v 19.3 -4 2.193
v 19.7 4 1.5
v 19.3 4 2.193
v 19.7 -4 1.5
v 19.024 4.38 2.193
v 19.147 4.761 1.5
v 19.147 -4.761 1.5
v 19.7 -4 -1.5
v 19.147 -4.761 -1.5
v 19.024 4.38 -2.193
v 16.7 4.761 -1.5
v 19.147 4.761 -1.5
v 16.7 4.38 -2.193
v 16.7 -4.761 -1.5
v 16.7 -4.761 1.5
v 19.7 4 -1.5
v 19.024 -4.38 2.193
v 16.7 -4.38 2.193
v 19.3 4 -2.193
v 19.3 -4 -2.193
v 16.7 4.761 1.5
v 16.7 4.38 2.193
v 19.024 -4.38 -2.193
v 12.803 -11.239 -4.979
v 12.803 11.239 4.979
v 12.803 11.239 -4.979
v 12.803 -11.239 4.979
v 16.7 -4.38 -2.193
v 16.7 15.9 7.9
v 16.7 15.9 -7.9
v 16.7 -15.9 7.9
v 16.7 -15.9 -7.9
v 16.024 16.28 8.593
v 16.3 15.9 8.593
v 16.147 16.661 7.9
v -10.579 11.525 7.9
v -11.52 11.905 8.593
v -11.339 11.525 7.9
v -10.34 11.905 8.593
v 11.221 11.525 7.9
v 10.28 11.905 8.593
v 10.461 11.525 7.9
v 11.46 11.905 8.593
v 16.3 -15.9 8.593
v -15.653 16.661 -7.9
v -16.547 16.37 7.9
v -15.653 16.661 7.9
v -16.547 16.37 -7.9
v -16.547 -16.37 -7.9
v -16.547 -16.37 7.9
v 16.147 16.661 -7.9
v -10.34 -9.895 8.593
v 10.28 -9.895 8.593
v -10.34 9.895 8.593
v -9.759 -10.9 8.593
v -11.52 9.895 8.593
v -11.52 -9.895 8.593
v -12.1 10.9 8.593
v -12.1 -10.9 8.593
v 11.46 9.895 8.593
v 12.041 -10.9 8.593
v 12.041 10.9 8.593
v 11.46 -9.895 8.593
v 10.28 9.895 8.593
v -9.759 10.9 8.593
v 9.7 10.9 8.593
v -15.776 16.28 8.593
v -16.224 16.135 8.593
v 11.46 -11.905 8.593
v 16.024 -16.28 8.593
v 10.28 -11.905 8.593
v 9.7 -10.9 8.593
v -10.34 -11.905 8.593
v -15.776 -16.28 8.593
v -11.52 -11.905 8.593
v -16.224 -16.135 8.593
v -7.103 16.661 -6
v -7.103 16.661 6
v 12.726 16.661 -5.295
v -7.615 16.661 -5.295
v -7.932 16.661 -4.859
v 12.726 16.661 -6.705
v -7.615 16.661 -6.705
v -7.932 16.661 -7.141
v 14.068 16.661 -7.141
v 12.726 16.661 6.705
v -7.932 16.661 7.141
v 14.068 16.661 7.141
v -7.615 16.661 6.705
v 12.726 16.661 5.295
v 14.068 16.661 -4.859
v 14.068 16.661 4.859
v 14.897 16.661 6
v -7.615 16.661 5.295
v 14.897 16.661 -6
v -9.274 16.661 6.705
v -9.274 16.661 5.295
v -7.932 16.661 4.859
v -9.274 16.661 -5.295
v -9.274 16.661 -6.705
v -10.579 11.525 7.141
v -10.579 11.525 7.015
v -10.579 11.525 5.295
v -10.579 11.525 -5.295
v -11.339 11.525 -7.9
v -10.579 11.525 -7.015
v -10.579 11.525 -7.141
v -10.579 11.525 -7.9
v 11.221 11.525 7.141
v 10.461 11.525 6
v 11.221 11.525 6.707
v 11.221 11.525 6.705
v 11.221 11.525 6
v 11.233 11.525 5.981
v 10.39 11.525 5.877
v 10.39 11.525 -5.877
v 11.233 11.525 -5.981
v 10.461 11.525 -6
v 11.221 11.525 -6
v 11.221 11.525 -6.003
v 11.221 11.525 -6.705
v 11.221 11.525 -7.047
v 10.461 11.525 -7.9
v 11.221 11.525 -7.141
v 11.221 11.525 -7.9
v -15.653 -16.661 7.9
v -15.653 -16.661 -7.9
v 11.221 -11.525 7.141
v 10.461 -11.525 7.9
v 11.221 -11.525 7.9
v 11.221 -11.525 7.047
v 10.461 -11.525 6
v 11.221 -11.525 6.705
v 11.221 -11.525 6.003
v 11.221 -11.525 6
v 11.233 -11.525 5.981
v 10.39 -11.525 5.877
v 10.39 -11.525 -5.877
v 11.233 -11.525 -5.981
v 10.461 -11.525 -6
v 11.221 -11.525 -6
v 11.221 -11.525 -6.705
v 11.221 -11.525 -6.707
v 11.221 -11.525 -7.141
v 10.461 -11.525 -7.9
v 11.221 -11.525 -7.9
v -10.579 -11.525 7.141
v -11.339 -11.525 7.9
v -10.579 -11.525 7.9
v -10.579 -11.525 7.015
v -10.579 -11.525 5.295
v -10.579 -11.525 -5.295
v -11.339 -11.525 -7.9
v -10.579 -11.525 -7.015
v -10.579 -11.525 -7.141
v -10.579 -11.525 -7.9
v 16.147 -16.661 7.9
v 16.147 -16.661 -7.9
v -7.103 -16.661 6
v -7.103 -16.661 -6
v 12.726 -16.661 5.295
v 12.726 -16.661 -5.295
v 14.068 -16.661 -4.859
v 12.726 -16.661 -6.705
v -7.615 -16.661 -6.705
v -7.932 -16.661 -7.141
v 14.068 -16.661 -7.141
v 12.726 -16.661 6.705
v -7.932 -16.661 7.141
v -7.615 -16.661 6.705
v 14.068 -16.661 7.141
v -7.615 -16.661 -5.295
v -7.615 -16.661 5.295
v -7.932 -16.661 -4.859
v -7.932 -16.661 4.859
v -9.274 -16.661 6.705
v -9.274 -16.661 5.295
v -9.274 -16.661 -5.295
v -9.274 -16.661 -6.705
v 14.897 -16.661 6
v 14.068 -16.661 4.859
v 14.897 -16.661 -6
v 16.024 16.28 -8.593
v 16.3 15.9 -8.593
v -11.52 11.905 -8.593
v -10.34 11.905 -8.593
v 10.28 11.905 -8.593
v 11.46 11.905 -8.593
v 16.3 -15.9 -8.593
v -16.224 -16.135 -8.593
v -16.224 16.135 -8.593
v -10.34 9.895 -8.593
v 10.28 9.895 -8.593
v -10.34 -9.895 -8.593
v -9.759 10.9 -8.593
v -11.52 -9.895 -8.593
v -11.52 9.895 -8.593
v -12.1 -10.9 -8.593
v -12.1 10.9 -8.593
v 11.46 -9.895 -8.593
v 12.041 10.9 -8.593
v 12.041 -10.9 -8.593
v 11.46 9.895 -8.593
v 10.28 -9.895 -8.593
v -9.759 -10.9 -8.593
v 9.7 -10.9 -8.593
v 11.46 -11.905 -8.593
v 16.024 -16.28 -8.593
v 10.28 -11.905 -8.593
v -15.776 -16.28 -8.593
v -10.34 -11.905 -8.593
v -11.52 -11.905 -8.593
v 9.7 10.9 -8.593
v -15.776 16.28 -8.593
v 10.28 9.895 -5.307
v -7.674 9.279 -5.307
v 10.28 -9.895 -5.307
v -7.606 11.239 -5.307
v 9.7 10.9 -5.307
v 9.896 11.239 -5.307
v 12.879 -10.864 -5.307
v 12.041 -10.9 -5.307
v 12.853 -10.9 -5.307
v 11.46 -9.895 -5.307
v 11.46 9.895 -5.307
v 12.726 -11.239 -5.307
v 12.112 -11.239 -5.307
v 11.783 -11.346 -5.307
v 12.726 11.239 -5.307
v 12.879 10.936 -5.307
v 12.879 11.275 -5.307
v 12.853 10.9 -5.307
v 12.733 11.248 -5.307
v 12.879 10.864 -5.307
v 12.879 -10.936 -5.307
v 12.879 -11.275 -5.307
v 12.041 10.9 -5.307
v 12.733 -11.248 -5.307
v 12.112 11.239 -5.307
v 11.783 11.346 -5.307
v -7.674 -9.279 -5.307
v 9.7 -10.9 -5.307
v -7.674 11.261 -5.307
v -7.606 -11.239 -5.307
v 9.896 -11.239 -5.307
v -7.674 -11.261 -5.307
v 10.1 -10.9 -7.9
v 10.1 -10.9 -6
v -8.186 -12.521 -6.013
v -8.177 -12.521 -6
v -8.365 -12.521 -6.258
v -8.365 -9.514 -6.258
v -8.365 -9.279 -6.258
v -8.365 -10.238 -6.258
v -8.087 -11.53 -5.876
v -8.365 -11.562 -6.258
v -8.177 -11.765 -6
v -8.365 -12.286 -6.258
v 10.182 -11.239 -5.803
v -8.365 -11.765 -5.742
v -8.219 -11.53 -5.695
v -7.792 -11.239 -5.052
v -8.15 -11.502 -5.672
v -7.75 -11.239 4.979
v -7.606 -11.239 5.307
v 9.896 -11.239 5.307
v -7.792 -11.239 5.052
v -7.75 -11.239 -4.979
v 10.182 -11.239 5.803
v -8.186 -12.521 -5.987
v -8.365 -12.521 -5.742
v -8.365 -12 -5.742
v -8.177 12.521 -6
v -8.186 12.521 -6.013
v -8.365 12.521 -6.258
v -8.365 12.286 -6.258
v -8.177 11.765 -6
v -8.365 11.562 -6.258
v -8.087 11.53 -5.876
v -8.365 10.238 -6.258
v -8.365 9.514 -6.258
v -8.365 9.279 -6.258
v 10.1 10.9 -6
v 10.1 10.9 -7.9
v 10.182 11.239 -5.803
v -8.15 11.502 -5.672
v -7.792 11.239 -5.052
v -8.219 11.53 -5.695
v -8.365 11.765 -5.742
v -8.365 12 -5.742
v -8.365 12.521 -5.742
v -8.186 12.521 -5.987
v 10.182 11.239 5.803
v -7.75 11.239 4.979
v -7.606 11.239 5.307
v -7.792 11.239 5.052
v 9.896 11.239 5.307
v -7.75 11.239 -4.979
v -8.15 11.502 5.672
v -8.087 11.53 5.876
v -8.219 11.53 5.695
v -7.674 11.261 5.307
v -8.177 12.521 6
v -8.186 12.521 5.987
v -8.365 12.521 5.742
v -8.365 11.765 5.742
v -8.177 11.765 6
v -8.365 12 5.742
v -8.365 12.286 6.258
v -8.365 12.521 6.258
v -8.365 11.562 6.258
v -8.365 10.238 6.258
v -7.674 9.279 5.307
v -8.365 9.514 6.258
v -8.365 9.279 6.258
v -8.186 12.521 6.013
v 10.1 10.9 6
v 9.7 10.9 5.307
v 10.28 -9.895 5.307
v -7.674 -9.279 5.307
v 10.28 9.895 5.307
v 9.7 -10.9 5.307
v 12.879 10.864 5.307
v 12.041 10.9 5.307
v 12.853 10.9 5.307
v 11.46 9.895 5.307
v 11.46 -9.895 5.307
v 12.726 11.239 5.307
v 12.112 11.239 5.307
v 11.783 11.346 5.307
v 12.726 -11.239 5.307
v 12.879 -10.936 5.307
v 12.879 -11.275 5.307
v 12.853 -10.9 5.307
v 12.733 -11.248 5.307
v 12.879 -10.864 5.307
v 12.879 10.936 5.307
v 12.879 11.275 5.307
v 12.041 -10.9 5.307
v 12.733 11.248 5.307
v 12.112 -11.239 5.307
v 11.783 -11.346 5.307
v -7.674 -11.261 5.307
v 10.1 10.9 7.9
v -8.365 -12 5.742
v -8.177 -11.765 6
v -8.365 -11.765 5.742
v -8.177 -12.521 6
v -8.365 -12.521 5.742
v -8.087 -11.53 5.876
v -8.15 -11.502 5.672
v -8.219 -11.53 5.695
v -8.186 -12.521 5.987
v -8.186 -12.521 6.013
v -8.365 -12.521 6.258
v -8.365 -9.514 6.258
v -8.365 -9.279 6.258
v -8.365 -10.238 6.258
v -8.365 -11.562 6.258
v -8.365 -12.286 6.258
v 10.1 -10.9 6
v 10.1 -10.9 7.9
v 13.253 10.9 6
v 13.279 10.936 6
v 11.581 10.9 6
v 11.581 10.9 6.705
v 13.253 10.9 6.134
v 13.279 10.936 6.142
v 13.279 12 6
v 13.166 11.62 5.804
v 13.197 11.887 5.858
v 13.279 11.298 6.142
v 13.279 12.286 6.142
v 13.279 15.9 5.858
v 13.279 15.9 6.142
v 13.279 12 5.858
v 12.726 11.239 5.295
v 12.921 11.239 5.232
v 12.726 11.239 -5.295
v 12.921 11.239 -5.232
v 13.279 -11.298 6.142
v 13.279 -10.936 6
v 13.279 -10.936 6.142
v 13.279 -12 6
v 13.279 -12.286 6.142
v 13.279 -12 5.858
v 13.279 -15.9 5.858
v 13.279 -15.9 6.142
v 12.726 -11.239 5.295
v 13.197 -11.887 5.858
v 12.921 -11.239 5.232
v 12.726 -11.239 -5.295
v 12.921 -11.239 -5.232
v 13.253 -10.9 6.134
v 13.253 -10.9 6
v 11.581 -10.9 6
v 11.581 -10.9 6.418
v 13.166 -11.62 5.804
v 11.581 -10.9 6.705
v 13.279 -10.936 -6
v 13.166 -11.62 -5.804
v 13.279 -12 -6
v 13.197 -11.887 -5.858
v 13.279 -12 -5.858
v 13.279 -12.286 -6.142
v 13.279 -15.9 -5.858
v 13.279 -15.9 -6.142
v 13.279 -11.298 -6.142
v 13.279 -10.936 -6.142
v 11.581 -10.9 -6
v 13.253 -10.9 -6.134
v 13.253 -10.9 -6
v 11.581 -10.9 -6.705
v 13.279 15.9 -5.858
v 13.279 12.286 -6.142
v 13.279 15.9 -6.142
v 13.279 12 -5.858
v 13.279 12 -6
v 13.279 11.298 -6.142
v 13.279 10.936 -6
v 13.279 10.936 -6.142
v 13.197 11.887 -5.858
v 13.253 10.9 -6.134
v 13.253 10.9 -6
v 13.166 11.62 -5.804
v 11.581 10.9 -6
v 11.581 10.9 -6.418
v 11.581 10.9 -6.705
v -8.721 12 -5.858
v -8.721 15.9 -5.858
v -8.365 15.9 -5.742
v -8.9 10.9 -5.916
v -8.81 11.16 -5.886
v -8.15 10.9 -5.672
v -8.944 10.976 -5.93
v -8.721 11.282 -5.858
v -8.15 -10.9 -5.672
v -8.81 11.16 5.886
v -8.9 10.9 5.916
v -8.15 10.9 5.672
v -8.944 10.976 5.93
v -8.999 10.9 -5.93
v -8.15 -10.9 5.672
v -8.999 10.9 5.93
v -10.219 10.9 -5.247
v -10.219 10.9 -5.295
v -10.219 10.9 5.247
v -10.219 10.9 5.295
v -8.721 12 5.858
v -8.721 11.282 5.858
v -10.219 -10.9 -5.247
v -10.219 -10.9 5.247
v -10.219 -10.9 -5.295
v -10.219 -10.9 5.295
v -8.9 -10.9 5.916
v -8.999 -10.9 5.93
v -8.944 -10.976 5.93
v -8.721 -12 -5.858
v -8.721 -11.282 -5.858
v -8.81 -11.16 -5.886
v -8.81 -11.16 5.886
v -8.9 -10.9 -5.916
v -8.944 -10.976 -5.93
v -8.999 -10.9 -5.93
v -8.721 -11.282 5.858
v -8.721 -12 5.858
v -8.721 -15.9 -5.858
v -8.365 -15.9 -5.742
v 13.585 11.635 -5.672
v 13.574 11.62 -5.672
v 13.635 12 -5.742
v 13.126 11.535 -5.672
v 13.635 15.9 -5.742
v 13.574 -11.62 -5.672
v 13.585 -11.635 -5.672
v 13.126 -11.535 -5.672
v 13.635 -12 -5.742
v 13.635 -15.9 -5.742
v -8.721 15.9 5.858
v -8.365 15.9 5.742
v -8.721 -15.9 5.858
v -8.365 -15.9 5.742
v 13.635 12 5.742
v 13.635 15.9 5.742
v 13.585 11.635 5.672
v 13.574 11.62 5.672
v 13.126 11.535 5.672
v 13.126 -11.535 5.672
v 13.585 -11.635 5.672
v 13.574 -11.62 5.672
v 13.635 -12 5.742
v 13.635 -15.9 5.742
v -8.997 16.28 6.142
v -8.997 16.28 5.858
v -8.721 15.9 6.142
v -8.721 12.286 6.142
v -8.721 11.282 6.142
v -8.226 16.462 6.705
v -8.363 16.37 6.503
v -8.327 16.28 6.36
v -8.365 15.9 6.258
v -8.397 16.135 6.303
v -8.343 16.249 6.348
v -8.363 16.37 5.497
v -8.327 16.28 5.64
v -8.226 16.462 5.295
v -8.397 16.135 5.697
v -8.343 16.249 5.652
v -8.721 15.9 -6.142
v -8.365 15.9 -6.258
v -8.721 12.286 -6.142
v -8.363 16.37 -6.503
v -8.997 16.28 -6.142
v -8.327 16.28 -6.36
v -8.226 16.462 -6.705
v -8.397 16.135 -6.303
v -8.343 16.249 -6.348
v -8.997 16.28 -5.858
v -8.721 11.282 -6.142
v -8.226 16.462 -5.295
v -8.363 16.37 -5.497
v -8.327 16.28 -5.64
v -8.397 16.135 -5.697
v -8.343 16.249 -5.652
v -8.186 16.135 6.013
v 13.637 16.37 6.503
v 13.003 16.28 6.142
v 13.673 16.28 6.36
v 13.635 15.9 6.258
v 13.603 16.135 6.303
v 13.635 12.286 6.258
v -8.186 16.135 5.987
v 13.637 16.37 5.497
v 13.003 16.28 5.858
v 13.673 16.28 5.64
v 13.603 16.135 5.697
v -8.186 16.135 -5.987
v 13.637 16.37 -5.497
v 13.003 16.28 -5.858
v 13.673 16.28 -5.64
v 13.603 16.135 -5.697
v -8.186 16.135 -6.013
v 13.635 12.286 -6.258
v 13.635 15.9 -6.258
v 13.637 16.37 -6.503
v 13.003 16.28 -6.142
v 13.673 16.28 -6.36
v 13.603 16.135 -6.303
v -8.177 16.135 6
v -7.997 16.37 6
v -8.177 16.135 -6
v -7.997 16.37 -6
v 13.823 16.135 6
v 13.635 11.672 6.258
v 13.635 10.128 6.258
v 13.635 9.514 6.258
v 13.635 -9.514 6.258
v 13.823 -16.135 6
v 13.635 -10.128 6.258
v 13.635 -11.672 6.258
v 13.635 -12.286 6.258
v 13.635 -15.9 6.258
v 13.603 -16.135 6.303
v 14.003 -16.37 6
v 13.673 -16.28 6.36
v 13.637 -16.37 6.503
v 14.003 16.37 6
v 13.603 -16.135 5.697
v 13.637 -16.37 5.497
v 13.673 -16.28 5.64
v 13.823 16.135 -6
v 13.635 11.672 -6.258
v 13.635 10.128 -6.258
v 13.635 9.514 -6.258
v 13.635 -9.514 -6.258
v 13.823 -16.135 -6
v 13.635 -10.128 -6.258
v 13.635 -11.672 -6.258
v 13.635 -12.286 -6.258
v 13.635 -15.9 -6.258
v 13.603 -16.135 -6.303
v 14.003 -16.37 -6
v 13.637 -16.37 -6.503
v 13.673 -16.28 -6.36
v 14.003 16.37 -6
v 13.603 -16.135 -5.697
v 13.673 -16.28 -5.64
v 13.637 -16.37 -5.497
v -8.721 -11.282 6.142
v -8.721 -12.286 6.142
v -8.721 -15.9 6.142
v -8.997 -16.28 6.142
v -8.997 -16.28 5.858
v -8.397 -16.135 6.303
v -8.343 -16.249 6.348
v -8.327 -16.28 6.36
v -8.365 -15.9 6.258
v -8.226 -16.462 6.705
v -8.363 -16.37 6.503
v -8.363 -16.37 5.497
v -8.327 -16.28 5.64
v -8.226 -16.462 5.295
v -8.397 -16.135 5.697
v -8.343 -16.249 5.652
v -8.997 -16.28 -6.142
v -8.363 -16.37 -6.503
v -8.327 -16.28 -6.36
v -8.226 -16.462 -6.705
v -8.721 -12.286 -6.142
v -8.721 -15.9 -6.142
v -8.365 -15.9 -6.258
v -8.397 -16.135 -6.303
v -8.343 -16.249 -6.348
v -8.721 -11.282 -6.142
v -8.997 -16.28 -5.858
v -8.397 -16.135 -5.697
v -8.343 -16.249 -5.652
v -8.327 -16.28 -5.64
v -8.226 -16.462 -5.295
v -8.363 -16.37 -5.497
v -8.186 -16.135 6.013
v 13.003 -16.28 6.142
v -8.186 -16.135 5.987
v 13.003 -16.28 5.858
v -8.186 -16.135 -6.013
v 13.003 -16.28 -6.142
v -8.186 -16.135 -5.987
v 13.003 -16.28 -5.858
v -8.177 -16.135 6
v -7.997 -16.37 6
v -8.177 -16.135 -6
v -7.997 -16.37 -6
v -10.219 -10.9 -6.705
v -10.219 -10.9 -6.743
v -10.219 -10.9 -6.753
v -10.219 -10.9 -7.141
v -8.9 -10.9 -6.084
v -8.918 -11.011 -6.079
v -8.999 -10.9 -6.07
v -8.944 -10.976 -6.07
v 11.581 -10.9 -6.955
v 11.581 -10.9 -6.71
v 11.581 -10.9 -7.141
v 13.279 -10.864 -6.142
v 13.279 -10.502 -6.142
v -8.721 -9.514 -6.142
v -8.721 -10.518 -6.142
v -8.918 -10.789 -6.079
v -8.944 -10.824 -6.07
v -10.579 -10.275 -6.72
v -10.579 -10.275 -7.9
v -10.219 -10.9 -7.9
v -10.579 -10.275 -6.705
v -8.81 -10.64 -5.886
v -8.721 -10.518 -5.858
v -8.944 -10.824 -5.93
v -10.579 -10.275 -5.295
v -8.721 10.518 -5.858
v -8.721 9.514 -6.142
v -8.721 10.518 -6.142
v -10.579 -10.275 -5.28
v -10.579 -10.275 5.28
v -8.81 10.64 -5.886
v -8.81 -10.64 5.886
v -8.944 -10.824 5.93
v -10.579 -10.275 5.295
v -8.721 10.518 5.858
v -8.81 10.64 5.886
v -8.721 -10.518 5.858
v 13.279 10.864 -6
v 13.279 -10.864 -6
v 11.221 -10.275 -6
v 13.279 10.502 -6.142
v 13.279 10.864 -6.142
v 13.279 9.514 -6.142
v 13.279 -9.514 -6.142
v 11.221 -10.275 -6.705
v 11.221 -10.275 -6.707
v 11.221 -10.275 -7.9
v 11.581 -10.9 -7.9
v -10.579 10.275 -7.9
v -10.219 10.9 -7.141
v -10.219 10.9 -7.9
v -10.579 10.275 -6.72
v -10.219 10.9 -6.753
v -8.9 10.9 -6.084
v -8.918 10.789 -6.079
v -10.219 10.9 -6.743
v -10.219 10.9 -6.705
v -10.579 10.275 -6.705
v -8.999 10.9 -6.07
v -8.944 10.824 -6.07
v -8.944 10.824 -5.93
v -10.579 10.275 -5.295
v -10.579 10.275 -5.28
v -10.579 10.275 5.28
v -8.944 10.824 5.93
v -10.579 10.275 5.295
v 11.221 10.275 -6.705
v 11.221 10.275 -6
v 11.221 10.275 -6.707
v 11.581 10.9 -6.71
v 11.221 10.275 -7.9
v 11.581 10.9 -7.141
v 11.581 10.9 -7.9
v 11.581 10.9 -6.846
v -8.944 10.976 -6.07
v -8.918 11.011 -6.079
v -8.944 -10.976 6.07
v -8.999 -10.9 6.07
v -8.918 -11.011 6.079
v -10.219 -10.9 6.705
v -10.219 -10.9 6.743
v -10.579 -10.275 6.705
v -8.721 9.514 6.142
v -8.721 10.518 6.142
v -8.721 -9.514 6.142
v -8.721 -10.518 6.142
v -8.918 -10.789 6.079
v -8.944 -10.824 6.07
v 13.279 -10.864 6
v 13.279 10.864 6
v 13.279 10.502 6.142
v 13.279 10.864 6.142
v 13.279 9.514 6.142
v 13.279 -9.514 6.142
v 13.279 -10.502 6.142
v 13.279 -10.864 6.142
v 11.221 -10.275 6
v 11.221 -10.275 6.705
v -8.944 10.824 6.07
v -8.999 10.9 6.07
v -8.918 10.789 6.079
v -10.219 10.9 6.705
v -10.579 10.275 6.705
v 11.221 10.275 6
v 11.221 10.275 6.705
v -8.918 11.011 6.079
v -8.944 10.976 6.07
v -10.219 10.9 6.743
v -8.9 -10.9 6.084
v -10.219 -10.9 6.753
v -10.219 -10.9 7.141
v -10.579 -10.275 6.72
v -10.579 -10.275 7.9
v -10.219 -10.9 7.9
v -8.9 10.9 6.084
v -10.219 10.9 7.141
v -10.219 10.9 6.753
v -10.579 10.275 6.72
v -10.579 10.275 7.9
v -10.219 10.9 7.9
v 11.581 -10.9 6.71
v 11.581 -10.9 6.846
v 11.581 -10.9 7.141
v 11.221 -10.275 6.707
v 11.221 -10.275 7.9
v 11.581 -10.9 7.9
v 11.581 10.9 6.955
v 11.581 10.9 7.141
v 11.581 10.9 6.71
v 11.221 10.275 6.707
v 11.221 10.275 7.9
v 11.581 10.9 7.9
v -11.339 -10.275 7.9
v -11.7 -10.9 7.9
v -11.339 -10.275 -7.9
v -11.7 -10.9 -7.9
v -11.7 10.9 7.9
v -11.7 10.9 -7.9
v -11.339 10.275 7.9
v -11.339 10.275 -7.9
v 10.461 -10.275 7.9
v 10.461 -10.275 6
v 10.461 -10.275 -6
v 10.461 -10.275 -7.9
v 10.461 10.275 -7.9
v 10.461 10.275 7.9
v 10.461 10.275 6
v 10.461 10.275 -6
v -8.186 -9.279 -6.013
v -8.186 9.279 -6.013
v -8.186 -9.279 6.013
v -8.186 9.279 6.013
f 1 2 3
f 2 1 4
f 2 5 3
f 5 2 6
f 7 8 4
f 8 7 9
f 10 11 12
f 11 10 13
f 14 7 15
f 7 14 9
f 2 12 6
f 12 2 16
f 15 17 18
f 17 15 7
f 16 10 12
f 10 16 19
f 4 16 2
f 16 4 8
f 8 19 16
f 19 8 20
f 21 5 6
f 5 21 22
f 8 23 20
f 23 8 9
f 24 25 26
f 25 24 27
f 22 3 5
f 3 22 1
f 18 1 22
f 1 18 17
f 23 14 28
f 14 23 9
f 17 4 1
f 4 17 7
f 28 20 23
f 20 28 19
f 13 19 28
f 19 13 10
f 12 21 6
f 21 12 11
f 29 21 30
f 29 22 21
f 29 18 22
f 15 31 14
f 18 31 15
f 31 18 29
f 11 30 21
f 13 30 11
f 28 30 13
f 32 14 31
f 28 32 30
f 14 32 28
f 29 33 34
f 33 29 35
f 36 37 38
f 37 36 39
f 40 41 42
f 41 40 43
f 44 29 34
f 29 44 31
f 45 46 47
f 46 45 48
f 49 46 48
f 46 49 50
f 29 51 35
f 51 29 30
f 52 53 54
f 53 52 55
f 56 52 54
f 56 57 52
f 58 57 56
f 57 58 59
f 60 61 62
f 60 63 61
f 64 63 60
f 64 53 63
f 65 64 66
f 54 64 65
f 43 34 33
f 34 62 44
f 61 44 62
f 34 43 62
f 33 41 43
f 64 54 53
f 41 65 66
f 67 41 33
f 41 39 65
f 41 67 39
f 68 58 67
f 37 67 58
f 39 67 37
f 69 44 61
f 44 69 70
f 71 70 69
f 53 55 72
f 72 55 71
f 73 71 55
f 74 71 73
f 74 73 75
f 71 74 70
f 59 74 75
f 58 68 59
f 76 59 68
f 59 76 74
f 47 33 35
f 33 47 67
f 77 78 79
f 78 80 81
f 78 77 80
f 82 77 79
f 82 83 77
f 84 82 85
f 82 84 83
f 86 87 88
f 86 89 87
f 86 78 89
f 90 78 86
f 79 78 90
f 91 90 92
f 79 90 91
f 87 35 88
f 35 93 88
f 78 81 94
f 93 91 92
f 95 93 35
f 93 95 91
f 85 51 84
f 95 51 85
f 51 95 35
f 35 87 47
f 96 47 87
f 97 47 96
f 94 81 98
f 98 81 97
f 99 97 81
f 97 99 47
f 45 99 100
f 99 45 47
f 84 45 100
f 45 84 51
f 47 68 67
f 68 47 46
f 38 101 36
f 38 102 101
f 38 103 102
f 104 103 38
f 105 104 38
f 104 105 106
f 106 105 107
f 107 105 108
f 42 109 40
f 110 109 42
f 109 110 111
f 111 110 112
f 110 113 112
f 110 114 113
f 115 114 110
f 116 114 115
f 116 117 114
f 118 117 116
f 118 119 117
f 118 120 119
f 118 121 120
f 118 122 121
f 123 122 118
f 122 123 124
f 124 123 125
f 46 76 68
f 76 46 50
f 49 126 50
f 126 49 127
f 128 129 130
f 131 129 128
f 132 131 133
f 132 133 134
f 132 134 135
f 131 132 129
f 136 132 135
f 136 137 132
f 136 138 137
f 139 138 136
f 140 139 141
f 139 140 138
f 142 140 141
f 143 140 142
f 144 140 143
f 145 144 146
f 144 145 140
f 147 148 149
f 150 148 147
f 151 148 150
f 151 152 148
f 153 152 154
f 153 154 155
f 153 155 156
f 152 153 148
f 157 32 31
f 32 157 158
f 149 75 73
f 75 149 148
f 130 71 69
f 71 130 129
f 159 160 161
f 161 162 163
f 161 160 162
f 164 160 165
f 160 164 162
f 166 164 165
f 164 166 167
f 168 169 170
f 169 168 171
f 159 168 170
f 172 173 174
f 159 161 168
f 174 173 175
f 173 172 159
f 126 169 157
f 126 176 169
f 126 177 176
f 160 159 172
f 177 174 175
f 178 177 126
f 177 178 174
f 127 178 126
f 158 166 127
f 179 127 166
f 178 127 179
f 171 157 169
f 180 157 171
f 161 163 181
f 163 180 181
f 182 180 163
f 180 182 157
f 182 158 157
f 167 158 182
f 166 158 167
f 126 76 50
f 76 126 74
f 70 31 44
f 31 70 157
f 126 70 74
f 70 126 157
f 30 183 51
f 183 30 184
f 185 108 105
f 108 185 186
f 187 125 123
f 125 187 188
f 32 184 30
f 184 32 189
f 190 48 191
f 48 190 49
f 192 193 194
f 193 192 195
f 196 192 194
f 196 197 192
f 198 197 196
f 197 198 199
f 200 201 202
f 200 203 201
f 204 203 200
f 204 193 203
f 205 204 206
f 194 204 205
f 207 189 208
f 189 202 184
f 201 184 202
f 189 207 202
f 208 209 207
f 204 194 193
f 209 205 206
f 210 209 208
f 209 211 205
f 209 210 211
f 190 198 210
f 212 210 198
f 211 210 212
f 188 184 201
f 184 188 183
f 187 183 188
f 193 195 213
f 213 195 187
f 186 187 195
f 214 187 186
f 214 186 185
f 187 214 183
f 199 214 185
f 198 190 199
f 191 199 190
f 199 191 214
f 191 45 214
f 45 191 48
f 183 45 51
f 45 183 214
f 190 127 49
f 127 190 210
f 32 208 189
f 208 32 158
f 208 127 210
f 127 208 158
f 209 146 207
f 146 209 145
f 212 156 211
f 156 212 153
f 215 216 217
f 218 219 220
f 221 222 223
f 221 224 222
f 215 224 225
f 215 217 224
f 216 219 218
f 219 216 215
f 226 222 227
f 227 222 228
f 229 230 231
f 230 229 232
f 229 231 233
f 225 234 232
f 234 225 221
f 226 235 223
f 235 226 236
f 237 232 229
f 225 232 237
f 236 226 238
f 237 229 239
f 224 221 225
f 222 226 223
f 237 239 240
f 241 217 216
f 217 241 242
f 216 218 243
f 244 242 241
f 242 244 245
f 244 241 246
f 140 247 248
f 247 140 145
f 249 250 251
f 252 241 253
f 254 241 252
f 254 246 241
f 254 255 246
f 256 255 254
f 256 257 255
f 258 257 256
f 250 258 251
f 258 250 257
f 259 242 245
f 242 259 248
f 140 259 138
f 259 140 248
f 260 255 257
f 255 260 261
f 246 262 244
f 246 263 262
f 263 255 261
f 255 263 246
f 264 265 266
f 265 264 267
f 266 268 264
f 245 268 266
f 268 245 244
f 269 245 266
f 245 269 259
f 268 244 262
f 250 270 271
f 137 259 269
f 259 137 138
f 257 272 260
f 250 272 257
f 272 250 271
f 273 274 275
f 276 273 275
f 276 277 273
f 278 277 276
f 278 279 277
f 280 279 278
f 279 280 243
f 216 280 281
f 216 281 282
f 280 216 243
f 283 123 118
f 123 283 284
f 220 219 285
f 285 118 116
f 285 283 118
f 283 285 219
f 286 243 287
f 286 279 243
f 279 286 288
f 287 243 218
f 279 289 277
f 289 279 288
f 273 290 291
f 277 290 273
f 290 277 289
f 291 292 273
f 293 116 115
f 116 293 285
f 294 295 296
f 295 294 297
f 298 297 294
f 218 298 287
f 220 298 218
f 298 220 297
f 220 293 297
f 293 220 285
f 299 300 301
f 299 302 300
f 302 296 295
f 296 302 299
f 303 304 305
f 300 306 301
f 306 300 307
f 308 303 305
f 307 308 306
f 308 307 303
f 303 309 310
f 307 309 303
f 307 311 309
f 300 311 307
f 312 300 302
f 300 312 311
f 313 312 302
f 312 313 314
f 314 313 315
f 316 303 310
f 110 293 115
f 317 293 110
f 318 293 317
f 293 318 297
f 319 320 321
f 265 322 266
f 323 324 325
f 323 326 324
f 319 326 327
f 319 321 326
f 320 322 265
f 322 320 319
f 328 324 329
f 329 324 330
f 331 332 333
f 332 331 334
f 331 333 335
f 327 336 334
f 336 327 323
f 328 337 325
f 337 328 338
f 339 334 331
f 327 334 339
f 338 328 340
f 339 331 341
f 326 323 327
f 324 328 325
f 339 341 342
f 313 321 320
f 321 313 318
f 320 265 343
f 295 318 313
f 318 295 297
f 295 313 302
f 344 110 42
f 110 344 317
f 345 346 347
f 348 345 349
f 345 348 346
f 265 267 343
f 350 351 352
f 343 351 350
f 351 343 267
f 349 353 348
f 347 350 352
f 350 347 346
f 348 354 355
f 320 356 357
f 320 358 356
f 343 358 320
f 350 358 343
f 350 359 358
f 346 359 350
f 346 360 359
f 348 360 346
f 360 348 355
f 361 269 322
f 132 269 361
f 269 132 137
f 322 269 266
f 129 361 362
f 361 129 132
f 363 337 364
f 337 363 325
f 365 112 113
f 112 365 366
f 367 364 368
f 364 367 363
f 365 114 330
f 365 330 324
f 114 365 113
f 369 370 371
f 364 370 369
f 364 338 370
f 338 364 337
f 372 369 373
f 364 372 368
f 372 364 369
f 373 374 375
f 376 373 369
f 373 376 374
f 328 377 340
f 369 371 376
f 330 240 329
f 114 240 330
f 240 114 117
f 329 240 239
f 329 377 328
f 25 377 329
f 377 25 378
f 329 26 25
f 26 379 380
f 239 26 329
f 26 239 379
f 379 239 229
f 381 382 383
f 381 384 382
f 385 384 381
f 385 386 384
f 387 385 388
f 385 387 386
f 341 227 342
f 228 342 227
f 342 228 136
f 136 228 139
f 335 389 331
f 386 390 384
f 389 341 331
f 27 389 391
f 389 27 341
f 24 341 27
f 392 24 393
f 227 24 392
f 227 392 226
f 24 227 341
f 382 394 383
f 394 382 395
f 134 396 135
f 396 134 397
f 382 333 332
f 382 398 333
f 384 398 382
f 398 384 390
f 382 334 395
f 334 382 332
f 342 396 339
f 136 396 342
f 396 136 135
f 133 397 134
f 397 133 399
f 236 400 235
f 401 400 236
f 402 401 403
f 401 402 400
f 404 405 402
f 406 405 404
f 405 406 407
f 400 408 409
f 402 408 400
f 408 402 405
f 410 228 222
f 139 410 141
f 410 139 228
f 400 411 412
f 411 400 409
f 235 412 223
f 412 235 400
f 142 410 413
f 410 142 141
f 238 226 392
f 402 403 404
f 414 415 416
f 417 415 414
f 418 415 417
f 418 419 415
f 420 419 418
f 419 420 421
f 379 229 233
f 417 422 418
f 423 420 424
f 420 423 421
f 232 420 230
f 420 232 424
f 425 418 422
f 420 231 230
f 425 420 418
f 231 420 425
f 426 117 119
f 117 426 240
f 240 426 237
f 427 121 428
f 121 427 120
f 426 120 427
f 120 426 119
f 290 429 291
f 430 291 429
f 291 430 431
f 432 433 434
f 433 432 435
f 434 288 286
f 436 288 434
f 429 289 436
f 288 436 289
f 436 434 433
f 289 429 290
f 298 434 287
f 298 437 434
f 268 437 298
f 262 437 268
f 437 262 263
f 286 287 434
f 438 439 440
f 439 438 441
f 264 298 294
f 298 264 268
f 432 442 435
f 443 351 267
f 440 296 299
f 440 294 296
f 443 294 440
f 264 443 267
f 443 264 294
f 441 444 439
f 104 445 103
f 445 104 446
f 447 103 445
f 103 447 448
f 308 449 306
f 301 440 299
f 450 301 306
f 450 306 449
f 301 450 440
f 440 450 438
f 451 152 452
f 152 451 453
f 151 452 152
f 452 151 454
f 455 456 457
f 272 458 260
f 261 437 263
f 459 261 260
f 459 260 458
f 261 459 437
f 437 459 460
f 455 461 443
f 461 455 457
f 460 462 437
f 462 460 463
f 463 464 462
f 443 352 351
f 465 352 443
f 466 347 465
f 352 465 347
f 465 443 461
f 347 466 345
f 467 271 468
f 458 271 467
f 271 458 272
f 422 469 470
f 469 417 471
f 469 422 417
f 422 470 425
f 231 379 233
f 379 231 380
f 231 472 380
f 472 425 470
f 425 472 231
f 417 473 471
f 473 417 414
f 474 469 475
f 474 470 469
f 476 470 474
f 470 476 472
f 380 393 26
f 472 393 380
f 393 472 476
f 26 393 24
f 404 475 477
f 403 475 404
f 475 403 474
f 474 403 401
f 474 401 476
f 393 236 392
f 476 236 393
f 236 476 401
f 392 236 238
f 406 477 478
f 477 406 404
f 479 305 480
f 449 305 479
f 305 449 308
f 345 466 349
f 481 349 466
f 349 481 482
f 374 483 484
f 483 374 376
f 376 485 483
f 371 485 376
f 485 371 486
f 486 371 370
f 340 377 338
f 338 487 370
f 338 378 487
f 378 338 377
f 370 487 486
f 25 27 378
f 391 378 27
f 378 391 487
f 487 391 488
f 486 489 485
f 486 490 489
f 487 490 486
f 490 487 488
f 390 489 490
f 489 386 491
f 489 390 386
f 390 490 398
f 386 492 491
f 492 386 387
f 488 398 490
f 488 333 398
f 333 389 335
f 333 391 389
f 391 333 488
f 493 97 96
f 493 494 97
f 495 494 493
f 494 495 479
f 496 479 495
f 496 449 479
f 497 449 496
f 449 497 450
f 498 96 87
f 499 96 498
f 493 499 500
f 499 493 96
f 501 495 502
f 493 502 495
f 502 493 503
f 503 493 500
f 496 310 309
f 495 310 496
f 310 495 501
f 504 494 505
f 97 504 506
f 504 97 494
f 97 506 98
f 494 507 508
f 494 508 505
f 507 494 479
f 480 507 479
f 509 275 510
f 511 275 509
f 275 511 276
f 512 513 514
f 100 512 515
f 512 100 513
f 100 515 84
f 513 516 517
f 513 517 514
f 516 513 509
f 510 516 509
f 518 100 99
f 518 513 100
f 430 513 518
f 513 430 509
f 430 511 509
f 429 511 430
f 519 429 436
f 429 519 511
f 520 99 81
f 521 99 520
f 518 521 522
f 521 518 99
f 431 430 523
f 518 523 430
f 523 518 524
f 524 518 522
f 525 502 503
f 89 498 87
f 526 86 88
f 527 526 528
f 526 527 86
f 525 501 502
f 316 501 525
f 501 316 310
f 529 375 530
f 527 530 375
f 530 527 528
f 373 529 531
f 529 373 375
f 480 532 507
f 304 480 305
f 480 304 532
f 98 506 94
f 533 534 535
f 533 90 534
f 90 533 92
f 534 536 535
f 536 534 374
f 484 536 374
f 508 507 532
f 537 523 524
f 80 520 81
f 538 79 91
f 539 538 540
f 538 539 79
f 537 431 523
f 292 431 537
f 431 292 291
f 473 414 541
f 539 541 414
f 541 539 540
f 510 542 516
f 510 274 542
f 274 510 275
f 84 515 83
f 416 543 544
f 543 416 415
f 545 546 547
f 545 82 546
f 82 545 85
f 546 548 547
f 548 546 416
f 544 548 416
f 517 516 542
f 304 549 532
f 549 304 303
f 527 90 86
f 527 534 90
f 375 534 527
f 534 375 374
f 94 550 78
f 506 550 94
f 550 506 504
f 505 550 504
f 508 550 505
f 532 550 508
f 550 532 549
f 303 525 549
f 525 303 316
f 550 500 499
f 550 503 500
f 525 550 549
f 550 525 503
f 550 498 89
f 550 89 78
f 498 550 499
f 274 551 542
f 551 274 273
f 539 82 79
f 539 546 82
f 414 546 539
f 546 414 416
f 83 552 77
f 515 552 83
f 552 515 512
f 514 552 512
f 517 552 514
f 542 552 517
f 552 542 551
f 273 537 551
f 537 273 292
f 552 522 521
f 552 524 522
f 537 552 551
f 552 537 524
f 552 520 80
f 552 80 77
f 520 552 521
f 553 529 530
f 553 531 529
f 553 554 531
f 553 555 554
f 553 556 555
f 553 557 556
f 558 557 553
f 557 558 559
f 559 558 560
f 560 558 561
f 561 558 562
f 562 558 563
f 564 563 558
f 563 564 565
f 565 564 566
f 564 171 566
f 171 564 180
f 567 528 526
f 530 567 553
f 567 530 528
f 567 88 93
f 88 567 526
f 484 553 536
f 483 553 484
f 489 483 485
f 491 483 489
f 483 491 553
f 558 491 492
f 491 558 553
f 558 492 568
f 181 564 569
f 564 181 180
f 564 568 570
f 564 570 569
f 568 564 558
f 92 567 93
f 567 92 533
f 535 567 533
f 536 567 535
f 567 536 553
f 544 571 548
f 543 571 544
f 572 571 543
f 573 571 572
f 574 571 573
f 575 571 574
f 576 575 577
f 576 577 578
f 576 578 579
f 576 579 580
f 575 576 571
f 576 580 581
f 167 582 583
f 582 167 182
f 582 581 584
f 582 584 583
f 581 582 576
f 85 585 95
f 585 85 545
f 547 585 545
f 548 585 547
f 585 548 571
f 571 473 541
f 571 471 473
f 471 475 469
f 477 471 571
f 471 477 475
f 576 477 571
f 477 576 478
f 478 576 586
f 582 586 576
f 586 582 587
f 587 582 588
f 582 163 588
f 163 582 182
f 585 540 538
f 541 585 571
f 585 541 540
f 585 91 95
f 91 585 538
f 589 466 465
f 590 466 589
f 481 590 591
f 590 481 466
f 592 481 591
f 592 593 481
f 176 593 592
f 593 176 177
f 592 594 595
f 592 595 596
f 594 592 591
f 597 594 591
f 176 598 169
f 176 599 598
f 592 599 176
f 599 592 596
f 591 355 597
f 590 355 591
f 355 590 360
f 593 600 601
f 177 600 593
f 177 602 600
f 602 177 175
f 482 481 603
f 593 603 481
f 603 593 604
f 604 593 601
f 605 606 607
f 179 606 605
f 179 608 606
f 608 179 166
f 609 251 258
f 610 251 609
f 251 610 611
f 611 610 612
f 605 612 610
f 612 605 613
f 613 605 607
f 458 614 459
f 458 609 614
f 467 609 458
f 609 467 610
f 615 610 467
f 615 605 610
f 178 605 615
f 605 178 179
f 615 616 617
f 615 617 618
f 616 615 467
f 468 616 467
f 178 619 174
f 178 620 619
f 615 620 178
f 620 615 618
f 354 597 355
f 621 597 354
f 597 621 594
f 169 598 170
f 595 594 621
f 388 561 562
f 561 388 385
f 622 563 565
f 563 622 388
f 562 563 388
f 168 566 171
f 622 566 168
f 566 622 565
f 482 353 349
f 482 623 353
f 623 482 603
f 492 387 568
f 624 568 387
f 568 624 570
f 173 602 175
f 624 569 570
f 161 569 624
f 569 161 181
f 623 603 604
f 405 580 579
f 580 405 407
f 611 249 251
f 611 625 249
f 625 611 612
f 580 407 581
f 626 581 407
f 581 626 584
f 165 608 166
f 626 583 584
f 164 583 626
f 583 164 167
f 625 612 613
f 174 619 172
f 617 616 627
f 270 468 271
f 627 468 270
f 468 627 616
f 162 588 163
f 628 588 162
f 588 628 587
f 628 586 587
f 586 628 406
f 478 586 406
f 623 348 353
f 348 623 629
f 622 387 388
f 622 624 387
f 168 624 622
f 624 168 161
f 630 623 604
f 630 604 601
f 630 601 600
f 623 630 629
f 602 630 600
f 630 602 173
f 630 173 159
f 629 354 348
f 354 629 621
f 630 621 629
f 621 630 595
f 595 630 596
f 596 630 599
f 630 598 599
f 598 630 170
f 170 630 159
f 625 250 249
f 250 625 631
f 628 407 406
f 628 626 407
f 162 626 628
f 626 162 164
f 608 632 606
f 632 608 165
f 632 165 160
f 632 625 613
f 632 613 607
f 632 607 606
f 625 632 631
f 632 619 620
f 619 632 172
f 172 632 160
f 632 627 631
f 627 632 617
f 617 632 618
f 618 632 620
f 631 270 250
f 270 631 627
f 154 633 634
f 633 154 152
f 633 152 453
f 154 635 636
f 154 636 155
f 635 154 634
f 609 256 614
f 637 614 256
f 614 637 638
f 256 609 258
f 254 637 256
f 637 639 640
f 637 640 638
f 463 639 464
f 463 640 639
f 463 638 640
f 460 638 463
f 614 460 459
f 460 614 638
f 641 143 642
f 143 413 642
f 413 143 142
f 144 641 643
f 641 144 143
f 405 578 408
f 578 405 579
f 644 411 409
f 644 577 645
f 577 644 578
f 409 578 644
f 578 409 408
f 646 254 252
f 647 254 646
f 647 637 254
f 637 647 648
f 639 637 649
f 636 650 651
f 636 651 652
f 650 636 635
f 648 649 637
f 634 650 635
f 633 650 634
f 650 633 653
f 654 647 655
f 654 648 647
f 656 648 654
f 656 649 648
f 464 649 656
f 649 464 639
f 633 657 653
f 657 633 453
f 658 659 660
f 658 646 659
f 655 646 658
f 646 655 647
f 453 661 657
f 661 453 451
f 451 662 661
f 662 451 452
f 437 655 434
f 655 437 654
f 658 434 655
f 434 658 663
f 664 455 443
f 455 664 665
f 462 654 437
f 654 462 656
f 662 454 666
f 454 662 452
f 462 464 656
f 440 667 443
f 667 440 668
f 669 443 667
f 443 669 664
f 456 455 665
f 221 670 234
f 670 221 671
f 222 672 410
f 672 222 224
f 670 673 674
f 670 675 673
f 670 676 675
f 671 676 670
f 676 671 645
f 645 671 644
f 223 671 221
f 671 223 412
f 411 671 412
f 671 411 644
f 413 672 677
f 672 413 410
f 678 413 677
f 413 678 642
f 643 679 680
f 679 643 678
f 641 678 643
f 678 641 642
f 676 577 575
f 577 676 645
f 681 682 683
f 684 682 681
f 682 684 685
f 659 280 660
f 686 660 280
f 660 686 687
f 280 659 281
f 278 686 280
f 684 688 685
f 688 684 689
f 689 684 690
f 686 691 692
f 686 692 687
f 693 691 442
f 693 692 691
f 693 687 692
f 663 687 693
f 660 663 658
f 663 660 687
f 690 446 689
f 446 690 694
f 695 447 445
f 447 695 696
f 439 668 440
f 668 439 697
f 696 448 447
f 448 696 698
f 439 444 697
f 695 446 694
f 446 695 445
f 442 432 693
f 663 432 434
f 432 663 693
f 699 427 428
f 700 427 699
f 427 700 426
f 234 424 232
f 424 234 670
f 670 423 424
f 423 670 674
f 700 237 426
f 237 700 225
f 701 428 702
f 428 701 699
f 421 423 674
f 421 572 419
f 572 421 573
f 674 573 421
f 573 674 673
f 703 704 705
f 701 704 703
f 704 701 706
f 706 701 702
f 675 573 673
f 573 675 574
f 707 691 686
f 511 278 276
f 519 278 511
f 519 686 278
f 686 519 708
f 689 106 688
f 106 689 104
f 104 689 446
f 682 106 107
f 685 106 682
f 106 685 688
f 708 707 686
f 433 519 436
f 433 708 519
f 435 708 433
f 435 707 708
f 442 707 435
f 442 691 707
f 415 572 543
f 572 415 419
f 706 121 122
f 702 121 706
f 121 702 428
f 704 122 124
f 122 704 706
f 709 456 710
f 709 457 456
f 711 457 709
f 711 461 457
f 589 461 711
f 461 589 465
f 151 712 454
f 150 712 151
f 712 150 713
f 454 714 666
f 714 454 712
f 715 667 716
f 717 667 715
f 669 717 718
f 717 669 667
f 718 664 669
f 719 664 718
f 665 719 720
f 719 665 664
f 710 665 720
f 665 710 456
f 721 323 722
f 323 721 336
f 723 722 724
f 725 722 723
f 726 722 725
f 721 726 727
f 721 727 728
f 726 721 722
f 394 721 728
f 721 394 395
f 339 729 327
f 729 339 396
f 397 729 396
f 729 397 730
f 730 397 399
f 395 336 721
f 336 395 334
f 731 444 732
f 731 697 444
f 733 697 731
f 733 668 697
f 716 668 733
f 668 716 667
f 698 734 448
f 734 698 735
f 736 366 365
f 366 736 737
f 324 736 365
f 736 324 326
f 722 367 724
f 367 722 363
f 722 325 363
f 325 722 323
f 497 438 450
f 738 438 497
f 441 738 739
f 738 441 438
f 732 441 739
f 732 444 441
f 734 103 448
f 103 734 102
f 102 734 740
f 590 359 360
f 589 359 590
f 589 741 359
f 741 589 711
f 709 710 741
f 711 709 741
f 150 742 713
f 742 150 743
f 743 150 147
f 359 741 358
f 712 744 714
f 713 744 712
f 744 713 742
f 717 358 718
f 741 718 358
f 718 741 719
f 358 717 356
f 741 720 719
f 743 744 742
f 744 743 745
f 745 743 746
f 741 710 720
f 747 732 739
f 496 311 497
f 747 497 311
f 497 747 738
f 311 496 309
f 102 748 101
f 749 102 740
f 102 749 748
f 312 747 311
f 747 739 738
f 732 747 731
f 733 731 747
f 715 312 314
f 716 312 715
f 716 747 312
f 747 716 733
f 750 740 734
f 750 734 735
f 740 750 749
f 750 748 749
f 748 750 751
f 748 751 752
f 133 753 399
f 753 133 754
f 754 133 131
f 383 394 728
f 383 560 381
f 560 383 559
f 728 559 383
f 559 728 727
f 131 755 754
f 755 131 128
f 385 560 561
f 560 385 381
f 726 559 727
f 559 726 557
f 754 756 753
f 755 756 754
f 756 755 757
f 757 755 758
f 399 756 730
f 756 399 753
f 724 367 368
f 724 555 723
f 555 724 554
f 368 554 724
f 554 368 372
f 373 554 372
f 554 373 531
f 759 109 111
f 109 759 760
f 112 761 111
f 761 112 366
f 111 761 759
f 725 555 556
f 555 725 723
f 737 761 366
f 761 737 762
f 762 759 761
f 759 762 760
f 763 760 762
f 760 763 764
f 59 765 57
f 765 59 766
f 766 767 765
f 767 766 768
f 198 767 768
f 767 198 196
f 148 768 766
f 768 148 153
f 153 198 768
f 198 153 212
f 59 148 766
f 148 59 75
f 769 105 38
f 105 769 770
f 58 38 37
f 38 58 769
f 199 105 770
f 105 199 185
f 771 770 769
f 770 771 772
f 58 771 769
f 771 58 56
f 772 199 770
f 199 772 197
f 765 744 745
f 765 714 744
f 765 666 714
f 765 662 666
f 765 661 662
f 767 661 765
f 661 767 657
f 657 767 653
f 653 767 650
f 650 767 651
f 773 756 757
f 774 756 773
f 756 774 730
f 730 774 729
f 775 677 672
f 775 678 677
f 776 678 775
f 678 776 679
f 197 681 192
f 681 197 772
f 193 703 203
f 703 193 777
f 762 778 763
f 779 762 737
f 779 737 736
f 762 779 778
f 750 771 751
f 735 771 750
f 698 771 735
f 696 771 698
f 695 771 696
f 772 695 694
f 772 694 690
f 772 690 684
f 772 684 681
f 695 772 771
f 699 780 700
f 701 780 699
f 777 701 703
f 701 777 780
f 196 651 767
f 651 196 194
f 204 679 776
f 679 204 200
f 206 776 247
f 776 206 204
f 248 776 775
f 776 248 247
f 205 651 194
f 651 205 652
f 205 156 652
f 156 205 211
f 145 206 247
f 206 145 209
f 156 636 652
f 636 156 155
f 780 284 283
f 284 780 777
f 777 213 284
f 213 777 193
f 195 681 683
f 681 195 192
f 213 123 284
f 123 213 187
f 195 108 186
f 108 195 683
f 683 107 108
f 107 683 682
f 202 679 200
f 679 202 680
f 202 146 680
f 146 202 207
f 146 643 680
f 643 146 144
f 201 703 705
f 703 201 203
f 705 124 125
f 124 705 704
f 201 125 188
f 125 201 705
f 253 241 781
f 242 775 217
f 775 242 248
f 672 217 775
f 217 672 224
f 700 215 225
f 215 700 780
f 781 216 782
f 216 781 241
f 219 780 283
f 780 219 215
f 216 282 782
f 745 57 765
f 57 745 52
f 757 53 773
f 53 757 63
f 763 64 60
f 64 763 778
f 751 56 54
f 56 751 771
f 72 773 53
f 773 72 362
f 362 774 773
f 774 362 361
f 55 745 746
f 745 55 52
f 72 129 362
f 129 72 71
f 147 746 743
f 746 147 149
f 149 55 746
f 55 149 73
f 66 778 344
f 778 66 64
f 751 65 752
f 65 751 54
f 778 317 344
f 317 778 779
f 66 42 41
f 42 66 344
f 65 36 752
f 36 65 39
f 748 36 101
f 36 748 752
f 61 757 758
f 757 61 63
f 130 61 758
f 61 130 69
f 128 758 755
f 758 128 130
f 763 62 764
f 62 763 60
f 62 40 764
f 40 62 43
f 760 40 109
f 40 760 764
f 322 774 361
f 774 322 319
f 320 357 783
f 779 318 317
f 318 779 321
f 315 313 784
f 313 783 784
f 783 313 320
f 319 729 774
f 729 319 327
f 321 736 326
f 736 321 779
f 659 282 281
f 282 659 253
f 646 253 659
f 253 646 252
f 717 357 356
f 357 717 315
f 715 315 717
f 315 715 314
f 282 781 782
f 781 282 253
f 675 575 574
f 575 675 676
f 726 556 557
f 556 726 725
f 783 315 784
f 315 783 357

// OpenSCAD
// Parameters
bbox_x = 31.8; //[15.9:63.6:0.1]
bbox_y = 31.8; //[15.9:63.6:0.1]
bbox_z = 15.8; //[7.9:31.6:0.1]
cutout_x = 22.0; //[11.0:44.0:0.1]
cutout_y = 24.0; //[12.0:48.0:0.1]
cutout_z = 12.0; //[6.0:24.0:0.1]
web_t = 4.9; //[2.45:9.8:0.1]
jaw_t = 3.9; //[1.95:7.8:0.1]
cutout_offset_x = 2.45; //[0.0:6.0:0.05]
lug_x = 4.0; //[2.0:8.0:0.1]
lug_y = 8.0; //[4.0:16.0:0.1]
lug_z = 3.0; //[1.5:6.0:0.1]
lug_offset_y = 0.0; //[-8.0:8.0:0.1]
lug_offset_z = 0.0; //[-4.0:4.0:0.1]
overlap = 1.0; //[0.5:2.0:0.1]
relief_r = 1.2; //[0.6:2.4:0.1]
mount_hole_r = 1.6; //[0.8:3.2:0.1]
mount_hole_edge_margin = 5.0; //[2.5:10.0:0.1]
chamfer_r = 0.8; //[0.4:1.6:0.1]

// Base Shapes
module outer_block() {
  cube([bbox_x, bbox_y, bbox_z], center=true);
}

module internal_rectangular_cutout() {
  translate([cutout_offset_x, 0, 0])
    cube([cutout_x, cutout_y, cutout_z], center=true);
}

module internal_corner_relief_cyl(pos) {
  translate(pos)
    rotate([90, 0, 0])
      cylinder(r=relief_r, h=bbox_y + 2*overlap, center=true);
}

module protruding_lug_stop() {
  translate([bbox_x/2 + lug_x/2 - overlap, lug_offset_y, lug_offset_z])
    cube([lug_x, lug_y, lug_z], center=true);
}

module mounting_hole(pos) {
  translate(pos)
    cylinder(r=mount_hole_r, h=bbox_z + 2*overlap, center=true);
}

module edge_fillet_chamfer_sphere() {
  sphere(r=chamfer_r, center=true);
}

module jaw_mask_box() {
  cube([bbox_x + 2*overlap, bbox_y + 2*overlap, 2*jaw_t], center=true);
}

module web_mask_box() {
  translate([-bbox_x/2 + web_t/2, 0, 0])
    cube([web_t + 2*overlap, bbox_y + 2*overlap, bbox_z + 2*overlap], center=true);
}

// Operations
module internal_corner_relief_union() {
  union() {
    internal_corner_relief_cyl([cutout_offset_x + cutout_x/2, 0, cutout_z/2]);
    internal_corner_relief_cyl([cutout_offset_x + cutout_x/2, 0, -cutout_z/2]);
    internal_corner_relief_cyl([cutout_offset_x - cutout_x/2, 0, cutout_z/2]);
    internal_corner_relief_cyl([cutout_offset_x - cutout_x/2, 0, -cutout_z/2]);
  }
}

module cutout_with_relief() {
  union() {
    internal_rectangular_cutout();
    internal_corner_relief_union();
  }
}

module u_channel_jaws_side_web_raw() {
  difference() {
    outer_block();
    cutout_with_relief();
  }
}

module mounting_holes_union() {
  union() {
    mounting_hole([-bbox_x/2 + mount_hole_edge_margin, -bbox_y/2 + mount_hole_edge_margin, 0]);
    mounting_hole([-bbox_x/2 + mount_hole_edge_margin, bbox_y/2 - mount_hole_edge_margin, 0]);
    mounting_hole([bbox_x/2 - mount_hole_edge_margin, -bbox_y/2 + mount_hole_edge_margin, 0]);
    mounting_hole([bbox_x/2 - mount_hole_edge_margin, bbox_y/2 - mount_hole_edge_margin, 0]);
  }
}

module u_channel_jaws_side_web_with_holes() {
  difference() {
    u_channel_jaws_side_web_raw();
    mounting_holes_union();
  }
}

module u_channel_jaws() {
  intersection() {
    u_channel_jaws_side_web_with_holes();
    jaw_mask_box();
  }
}

module side_web() {
  intersection() {
    u_channel_jaws_side_web_with_holes();
    web_mask_box();
  }
}

module bracket_with_lug() {
  union() {
    u_channel_jaws_side_web_with_holes();
    protruding_lug_stop();
  }
}

// Final Output
minkowski() {
  bracket_with_lug();
  edge_fillet_chamfer_sphere();
}
